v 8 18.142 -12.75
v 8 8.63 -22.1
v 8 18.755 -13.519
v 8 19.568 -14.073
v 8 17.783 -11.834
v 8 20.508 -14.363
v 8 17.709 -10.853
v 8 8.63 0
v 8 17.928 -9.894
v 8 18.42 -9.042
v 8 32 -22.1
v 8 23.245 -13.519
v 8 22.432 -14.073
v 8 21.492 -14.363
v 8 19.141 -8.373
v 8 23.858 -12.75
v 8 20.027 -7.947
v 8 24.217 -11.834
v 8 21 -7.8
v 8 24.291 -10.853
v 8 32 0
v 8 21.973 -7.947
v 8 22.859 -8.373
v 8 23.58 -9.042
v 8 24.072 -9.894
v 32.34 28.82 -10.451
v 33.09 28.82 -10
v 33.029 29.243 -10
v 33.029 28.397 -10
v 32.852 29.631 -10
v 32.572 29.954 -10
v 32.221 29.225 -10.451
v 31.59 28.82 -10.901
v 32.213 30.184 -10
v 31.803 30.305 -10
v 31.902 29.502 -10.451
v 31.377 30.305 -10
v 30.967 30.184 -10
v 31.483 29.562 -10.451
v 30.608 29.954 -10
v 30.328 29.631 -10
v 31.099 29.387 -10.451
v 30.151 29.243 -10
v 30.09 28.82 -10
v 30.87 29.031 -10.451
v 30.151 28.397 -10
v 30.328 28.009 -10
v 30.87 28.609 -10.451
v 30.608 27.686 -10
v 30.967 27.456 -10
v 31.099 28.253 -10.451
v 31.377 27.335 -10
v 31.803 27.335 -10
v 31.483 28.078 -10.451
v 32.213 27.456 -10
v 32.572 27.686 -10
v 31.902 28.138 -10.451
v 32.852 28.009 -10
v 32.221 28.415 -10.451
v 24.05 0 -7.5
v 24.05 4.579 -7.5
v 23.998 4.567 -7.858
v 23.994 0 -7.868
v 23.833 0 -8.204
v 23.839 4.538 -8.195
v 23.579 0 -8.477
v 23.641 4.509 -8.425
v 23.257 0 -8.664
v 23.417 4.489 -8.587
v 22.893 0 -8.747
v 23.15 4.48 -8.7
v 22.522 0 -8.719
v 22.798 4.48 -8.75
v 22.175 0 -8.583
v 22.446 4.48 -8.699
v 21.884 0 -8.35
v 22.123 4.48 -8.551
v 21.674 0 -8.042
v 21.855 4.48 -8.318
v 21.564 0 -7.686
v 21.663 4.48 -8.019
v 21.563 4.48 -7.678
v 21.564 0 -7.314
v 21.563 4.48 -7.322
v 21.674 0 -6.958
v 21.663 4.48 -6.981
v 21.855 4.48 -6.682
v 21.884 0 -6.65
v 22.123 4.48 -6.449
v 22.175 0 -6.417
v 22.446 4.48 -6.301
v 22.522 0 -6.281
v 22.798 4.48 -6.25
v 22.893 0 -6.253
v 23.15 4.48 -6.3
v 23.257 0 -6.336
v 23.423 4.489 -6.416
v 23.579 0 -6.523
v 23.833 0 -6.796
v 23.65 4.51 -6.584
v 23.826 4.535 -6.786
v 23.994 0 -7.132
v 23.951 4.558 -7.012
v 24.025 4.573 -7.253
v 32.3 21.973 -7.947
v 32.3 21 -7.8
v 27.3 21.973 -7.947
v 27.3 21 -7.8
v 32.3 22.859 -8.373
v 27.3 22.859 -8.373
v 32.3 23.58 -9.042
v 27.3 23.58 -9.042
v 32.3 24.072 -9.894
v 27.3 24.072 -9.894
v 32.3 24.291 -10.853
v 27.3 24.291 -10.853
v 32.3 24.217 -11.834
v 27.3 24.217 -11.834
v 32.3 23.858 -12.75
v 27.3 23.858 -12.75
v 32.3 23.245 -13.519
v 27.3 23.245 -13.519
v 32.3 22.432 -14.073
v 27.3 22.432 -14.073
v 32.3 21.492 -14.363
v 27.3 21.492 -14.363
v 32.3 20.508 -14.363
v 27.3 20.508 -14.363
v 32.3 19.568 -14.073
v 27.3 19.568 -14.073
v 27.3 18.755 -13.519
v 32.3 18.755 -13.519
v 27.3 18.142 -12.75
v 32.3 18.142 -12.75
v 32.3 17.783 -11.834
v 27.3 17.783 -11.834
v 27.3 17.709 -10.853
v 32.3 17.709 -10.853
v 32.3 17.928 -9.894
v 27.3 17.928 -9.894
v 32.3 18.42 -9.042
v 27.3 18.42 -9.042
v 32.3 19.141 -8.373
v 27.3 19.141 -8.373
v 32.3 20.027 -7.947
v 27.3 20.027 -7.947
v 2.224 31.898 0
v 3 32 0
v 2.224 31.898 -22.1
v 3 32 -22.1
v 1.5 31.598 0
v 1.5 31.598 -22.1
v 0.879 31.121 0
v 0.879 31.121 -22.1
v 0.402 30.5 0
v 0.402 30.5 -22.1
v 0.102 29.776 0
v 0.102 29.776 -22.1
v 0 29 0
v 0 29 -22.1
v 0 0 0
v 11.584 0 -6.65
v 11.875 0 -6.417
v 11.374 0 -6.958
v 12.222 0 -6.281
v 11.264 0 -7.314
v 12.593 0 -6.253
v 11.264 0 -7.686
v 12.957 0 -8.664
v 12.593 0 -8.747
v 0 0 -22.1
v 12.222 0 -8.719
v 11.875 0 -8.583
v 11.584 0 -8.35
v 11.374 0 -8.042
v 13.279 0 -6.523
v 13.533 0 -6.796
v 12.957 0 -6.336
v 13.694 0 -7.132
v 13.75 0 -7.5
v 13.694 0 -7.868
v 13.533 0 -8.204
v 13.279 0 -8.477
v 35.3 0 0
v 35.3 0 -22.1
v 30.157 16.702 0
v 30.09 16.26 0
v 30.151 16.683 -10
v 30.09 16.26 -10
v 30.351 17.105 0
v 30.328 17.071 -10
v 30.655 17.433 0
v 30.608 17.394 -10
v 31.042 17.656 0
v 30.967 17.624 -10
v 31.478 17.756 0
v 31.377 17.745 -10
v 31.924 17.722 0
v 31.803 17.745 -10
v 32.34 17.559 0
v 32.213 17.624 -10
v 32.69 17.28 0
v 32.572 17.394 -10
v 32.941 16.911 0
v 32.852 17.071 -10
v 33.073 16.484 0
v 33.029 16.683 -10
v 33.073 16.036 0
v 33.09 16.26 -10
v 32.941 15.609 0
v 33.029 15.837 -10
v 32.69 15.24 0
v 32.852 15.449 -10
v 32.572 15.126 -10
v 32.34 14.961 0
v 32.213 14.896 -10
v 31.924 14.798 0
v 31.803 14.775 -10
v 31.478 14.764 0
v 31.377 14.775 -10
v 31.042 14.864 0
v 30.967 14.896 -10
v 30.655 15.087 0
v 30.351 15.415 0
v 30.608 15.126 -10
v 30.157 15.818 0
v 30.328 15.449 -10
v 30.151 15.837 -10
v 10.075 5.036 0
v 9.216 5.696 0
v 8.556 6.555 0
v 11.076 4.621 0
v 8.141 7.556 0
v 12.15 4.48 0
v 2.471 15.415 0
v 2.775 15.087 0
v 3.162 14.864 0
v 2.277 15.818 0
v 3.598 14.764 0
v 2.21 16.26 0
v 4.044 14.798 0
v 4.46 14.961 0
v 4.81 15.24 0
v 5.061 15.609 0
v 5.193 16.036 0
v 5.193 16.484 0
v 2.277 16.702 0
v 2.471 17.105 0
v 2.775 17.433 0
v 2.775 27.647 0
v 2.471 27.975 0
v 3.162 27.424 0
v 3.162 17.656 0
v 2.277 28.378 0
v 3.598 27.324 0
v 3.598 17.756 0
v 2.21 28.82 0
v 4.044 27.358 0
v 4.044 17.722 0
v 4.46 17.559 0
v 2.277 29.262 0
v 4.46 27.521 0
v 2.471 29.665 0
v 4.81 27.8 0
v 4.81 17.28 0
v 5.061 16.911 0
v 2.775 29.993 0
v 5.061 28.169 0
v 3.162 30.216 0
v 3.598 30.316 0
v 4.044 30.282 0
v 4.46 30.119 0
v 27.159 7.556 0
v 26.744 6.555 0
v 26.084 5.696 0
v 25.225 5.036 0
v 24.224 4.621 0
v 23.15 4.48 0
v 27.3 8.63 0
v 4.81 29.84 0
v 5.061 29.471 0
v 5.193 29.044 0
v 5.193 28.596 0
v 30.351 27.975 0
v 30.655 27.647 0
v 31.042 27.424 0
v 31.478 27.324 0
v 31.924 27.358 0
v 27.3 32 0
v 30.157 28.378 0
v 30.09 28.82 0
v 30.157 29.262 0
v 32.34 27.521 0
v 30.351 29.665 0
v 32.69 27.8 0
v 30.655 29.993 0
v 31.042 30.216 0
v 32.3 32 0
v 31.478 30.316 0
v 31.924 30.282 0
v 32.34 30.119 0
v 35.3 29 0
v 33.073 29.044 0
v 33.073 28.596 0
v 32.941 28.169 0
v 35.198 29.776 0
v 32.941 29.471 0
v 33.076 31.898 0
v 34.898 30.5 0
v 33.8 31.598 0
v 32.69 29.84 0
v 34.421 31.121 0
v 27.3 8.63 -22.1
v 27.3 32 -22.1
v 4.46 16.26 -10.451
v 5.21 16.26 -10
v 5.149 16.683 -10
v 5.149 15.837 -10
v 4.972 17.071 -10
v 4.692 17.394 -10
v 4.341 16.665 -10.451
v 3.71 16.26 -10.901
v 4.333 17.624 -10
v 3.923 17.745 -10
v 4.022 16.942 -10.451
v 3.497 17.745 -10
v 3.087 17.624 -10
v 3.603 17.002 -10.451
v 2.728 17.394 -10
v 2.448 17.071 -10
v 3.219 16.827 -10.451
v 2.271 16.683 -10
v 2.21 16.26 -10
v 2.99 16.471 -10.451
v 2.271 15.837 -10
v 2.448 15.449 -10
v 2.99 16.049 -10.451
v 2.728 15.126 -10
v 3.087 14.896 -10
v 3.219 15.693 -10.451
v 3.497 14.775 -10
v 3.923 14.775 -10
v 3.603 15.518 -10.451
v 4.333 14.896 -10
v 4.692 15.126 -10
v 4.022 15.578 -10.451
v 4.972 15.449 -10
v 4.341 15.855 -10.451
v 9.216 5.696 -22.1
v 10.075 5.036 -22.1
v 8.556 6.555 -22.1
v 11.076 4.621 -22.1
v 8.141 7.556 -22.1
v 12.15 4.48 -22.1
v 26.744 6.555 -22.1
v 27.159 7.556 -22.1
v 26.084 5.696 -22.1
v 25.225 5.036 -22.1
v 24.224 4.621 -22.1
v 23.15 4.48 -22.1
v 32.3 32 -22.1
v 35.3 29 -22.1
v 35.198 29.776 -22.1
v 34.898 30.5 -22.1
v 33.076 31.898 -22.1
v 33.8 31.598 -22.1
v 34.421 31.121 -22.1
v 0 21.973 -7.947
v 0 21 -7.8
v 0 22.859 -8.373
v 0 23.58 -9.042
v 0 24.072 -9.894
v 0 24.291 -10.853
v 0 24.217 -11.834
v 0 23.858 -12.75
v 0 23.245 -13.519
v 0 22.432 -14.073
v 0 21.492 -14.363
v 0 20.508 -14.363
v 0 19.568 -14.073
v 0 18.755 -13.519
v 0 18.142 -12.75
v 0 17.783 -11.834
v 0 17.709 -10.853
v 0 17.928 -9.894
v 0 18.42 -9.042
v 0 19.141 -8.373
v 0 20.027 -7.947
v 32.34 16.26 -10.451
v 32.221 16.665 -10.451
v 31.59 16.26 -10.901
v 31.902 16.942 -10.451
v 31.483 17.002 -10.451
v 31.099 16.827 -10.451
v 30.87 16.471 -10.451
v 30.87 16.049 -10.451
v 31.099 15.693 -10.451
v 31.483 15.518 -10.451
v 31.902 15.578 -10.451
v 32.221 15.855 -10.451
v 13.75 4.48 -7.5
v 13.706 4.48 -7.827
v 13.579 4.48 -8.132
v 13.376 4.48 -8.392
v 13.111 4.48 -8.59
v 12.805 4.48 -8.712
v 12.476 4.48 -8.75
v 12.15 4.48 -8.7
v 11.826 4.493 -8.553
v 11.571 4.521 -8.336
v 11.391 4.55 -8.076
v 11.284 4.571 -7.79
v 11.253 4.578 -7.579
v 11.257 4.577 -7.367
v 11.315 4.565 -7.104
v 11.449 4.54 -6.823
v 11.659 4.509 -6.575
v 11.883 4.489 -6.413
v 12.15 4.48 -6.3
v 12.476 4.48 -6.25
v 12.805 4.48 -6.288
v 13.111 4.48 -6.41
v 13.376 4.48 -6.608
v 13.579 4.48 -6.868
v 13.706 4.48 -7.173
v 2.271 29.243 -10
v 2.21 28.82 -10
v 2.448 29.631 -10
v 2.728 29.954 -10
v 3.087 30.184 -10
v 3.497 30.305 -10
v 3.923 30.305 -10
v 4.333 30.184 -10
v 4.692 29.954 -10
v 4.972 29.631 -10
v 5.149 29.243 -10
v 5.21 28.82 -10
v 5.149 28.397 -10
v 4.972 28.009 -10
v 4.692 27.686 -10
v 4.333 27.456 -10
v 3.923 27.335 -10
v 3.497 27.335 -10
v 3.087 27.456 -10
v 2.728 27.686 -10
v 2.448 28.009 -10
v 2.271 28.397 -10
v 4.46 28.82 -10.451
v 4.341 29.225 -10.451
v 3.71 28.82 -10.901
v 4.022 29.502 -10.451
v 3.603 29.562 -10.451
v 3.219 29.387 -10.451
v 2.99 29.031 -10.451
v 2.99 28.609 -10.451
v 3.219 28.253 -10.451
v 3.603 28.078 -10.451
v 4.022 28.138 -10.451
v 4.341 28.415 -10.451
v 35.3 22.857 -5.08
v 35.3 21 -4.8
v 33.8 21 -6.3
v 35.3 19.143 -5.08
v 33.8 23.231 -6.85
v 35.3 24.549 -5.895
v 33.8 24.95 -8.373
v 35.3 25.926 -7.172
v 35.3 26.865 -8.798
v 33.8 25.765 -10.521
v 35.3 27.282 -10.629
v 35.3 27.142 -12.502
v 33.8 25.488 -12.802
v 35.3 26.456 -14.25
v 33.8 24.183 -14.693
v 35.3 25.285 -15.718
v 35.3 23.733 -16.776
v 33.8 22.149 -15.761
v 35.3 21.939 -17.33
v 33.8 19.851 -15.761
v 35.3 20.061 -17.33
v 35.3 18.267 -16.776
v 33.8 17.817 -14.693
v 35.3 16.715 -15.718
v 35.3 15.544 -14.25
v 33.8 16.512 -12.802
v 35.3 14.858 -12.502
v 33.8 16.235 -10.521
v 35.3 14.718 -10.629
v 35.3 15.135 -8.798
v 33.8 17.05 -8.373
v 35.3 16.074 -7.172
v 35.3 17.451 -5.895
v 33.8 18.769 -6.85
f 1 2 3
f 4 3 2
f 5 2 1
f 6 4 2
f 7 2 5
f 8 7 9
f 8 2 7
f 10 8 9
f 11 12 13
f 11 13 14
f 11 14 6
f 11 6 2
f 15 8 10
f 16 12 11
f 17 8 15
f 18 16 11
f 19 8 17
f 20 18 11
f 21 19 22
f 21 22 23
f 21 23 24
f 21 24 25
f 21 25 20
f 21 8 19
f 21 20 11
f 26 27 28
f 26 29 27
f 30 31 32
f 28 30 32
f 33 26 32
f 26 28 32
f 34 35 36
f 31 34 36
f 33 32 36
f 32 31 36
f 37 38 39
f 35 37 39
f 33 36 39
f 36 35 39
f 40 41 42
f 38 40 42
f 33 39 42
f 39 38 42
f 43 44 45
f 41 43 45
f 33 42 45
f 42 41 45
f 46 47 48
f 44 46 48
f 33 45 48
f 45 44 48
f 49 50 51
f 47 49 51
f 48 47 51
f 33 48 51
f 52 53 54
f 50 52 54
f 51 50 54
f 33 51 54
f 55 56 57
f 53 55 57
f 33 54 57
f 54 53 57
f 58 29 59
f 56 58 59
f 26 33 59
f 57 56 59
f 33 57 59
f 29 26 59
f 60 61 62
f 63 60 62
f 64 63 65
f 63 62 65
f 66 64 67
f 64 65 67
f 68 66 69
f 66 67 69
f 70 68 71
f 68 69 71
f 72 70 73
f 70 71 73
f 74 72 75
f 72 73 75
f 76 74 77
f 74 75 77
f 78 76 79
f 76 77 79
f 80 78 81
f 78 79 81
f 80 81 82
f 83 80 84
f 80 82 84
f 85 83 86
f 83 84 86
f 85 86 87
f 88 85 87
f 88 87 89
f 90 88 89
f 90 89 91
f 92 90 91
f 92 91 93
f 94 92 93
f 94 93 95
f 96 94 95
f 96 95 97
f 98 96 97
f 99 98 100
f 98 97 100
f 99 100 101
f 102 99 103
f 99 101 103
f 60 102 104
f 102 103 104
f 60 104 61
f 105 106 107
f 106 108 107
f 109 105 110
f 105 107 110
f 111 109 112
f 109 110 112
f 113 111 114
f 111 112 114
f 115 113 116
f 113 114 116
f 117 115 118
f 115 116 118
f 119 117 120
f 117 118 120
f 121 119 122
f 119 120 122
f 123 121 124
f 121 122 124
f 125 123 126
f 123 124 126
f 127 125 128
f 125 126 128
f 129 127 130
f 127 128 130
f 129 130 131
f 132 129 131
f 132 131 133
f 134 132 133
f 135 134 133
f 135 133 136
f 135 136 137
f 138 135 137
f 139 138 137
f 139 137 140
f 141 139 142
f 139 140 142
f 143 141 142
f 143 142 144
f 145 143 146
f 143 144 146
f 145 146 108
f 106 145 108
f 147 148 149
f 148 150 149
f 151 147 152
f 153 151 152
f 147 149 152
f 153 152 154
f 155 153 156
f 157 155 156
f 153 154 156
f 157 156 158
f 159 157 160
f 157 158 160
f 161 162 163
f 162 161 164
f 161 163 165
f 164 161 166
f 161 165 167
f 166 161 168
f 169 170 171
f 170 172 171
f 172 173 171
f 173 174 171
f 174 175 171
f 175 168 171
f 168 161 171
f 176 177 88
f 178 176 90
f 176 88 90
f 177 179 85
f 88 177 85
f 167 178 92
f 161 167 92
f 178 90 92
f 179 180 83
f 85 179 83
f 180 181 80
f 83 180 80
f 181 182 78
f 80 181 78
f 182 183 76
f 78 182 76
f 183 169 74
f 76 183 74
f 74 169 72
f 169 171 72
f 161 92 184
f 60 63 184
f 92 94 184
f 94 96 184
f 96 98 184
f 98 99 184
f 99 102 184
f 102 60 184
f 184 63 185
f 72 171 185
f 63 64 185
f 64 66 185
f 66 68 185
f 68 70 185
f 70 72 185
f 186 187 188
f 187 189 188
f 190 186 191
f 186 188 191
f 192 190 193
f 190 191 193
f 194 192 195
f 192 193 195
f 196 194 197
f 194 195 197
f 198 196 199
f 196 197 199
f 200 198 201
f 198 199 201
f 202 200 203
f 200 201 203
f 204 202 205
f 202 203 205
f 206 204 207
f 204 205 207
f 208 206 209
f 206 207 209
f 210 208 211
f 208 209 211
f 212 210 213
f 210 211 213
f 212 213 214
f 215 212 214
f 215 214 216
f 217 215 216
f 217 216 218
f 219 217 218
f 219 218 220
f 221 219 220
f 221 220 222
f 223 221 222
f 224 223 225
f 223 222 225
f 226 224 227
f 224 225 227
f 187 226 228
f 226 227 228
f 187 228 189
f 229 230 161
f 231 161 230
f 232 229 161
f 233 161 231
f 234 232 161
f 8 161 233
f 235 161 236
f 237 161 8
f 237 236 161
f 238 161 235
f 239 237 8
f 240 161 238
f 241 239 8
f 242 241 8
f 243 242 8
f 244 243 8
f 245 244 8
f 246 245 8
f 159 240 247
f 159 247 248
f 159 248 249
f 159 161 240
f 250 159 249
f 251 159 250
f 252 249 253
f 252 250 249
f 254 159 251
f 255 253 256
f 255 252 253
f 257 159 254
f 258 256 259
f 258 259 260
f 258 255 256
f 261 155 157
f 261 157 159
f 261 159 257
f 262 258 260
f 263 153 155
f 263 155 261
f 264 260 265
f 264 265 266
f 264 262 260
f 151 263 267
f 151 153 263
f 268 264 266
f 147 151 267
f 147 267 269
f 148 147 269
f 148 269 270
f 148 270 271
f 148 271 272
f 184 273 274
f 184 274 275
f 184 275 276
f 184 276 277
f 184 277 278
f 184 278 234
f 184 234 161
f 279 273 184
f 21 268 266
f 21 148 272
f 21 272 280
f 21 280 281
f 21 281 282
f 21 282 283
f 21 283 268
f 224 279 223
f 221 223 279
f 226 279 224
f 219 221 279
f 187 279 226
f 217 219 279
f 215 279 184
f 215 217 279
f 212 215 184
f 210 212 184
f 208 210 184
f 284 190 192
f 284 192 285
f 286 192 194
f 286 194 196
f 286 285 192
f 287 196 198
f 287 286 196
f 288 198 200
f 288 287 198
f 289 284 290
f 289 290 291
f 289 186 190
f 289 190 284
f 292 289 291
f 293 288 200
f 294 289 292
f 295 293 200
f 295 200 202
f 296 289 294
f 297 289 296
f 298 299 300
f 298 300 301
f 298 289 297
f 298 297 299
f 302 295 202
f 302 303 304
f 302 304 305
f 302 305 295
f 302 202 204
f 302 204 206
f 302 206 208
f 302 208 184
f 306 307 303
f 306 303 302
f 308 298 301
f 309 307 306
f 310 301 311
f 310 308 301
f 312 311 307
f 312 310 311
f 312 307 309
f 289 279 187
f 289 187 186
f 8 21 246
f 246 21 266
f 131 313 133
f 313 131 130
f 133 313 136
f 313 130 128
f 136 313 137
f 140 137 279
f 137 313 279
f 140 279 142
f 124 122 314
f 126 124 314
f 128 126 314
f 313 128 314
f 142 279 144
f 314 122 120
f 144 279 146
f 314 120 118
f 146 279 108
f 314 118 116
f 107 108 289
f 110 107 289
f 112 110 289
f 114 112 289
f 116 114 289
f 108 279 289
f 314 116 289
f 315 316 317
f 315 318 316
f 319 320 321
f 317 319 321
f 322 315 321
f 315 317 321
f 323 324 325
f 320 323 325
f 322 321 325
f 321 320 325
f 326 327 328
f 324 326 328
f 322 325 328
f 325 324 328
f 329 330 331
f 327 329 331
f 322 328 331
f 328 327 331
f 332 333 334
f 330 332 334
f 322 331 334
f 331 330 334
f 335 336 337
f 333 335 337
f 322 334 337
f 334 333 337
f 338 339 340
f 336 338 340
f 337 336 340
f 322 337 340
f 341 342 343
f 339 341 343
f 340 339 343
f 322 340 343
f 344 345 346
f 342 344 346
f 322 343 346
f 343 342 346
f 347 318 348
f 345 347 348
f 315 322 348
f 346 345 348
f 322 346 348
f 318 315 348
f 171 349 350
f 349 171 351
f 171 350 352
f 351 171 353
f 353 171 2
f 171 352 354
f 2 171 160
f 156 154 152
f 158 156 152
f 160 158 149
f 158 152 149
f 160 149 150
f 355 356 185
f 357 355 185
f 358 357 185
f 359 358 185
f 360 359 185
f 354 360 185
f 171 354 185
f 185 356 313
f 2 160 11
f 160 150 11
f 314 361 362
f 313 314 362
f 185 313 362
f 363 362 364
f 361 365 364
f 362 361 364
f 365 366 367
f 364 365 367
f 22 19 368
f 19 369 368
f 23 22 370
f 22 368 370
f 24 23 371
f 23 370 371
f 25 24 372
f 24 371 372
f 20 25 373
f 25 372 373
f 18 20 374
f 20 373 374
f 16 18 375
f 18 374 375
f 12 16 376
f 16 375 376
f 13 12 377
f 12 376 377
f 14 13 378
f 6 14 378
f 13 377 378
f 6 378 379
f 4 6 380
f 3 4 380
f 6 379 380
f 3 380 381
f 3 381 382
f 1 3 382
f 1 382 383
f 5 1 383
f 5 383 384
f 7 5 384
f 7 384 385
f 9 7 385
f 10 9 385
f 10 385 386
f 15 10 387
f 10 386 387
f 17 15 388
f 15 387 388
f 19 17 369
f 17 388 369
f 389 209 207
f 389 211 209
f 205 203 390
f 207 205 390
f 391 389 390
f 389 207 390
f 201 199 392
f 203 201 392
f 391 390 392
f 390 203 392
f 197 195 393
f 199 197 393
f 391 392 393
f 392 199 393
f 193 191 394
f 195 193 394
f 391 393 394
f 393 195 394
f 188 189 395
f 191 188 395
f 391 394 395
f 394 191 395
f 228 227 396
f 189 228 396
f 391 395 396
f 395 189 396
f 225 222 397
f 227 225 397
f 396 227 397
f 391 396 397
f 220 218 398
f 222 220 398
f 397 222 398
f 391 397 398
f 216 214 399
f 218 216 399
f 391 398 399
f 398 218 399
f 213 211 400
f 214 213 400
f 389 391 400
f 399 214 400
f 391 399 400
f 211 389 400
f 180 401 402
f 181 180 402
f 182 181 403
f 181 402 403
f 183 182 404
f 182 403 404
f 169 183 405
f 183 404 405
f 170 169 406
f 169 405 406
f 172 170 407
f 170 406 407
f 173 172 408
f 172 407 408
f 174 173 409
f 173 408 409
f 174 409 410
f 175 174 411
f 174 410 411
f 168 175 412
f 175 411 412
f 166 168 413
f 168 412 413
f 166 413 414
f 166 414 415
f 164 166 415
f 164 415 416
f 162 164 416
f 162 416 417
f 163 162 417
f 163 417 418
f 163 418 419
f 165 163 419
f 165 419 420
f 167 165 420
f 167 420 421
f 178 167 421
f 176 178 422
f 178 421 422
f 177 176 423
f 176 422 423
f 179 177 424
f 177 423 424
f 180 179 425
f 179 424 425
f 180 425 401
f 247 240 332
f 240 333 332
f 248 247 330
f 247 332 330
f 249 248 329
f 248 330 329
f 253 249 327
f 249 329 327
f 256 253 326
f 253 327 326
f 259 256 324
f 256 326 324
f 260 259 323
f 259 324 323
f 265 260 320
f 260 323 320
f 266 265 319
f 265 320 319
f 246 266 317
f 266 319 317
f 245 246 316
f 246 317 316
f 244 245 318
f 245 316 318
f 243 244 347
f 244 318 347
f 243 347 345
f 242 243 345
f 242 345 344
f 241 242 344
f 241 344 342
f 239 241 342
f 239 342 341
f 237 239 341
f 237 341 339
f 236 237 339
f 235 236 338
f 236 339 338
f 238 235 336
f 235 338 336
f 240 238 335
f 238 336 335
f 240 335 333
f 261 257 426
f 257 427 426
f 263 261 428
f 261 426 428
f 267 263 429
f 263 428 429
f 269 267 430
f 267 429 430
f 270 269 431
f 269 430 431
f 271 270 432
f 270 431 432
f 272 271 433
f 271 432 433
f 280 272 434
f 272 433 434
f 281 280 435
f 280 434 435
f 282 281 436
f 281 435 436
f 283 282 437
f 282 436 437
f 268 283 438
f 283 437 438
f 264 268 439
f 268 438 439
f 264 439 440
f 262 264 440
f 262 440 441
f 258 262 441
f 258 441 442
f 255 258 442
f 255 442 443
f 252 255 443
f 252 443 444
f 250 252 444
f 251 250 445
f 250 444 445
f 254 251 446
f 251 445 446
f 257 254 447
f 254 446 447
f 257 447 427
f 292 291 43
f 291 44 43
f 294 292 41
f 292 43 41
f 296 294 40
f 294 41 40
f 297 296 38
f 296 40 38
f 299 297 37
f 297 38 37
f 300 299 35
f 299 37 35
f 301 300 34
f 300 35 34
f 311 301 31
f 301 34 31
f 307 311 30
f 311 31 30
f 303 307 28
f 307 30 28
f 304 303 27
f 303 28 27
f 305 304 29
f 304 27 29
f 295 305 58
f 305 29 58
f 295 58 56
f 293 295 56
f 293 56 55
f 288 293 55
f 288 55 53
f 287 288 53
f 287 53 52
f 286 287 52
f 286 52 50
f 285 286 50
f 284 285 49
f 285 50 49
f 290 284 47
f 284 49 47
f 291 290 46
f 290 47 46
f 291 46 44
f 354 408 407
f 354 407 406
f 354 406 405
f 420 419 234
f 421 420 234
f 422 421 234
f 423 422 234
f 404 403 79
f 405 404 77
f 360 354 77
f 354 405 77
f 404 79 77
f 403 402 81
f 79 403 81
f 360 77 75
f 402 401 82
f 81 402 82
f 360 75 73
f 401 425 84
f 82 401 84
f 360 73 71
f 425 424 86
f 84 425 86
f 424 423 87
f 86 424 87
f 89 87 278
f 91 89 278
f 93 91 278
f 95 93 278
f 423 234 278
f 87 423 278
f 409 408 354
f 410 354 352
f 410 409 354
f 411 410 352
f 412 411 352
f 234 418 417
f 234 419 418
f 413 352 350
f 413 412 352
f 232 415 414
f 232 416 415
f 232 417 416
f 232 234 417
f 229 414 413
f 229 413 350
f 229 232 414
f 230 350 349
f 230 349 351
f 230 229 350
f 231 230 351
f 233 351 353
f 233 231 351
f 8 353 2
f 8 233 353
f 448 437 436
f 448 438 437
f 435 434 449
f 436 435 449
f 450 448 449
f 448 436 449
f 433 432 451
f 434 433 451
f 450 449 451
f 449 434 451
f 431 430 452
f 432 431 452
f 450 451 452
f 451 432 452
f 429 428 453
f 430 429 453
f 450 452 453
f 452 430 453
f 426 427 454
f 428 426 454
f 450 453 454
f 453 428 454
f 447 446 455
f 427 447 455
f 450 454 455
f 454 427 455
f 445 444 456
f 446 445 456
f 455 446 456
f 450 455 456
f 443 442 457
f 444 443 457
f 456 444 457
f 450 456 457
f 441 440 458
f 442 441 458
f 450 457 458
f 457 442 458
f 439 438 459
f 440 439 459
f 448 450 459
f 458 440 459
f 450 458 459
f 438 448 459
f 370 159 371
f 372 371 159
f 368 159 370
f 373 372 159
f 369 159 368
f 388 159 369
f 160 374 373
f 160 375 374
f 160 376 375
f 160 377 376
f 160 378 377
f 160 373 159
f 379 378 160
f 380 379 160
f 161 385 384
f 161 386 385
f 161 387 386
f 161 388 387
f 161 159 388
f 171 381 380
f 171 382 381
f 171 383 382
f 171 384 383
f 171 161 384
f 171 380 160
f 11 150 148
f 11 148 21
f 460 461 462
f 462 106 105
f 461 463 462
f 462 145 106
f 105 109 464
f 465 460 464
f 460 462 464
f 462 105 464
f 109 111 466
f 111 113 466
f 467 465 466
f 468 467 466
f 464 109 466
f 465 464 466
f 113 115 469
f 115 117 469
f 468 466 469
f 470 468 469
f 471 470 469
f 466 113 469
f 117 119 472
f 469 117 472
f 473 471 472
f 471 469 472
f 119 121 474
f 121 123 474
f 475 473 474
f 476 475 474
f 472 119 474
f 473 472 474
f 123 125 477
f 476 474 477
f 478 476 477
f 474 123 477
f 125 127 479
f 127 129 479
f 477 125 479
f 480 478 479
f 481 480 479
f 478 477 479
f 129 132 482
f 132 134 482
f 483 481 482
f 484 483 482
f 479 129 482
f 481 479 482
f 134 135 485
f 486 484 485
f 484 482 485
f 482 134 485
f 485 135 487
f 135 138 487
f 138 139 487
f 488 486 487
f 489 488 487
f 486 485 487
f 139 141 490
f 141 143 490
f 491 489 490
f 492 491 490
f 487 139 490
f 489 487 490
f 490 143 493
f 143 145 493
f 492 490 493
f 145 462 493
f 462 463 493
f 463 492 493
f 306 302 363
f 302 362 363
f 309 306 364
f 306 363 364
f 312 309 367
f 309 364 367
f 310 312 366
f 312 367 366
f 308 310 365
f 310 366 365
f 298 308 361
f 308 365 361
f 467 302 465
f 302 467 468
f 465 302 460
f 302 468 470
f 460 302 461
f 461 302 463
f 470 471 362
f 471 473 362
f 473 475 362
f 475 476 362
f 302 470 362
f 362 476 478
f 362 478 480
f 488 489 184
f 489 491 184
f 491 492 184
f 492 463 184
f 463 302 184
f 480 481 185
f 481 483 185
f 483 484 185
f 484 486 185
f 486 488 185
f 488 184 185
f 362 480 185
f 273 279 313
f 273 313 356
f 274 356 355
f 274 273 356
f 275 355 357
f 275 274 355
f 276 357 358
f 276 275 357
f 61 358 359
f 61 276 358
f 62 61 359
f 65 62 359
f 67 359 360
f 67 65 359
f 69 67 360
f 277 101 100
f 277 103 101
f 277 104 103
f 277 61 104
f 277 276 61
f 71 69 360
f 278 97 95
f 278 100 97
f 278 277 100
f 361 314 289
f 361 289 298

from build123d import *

# Parameters (mm, degrees)
SKETCH1_W                                           = 35.3
SKETCH1_H                                           = 22.1
BOSS_EXTRUDE1_DEPTH                                 = 32
SKETCH2_W                                           = 19.3
SKETCH2_H                                           = 27.52
CUT_EXTRUDE1_DEPTH                                  = 32
BOSS_EXTRUDE2_DEPTH                                 = 22.1
FILLET1_R                                           = 3
CSK_FOR_M6_COUNTERSUNK_FLAT_HEAD_SCREW1_D           = 6.6
CSK_FOR_M6_COUNTERSUNK_FLAT_HEAD_SCREW1_DEPTH       = 45
CSK_FOR_M6_COUNTERSUNK_FLAT_HEAD_SCREW1_CSINK_D     = 12.6
CSK_FOR_M6_COUNTERSUNK_FLAT_HEAD_SCREW1_CSINK_ANGLE = 90
CSK_FOR_M6_COUNTERSUNK_FLAT_HEAD_SCREW1_TIP         = 1.982840043
F_3_0MM_DOWEL_HOLE1_D                               = 3
F_3_0MM_DOWEL_HOLE1_DEPTH                           = 10
F_3_0MM_DOWEL_HOLE1_TIP                             = 0.901290929
F_2_5MM_DOWEL_HOLE1_D                               = 2.5
F_2_5MM_DOWEL_HOLE1_DEPTH                           = 10
F_2_5MM_DOWEL_HOLE1_TIP                             = 0.751075774


with BuildPart() as part:
    # Sketch1 → Boss-Extrude1 (new body)
    with BuildSketch(Plane(origin=(0, 0, 0), x_dir=(1, 0, 0), z_dir=(0, 1, 0))):
        with Locations((17.65, 11.05)):
            Rectangle(SKETCH1_W, SKETCH1_H)
    extrude(amount=BOSS_EXTRUDE1_DEPTH)

    # Sketch2 → Cut-Extrude1 (cut)
    with BuildSketch(Plane.XY):
        with Locations((17.65, 18.24)):
            Rectangle(SKETCH2_W, SKETCH2_H)
    extrude(amount=-CUT_EXTRUDE1_DEPTH, mode=Mode.SUBTRACT)

    # Sketch3 → Boss-Extrude2 (add)
    with BuildSketch(Plane.XY):
        with BuildLine():
            Line((8, 8.63), (8, 4.48))
            Line((8, 4.48), (12.15, 4.48))
            ThreePointArc((12.15, 4.48), (9.215506858, 5.695506858), (8, 8.63))
        make_face()
        with BuildLine():
            Line((27.3, 4.48), (27.3, 8.63))
            ThreePointArc((27.3, 8.63), (26.084493142, 5.695506858), (23.15, 4.48))
            Line((23.15, 4.48), (27.3, 4.48))
        make_face()
    extrude(amount=-BOSS_EXTRUDE2_DEPTH)

    # Fillet1
    fillet1_edges = [part.edges().sort_by_distance(p)[0] for p in [
        (35.3, 32, -11.05),
        (0, 32, -11.05),
    ]]
    fillet(fillet1_edges, radius=FILLET1_R)

    # CSK for M6 Countersunk Flat Head Screw1
    with Locations(Plane(origin=(35.3, 0, 0), x_dir=(0, 0, -1), z_dir=(1, 0, 0))):
        with Locations((11.1, 21)):
            CounterSinkHole(CSK_FOR_M6_COUNTERSUNK_FLAT_HEAD_SCREW1_D / 2, CSK_FOR_M6_COUNTERSUNK_FLAT_HEAD_SCREW1_CSINK_D / 2, depth=CSK_FOR_M6_COUNTERSUNK_FLAT_HEAD_SCREW1_DEPTH, counter_sink_angle=CSK_FOR_M6_COUNTERSUNK_FLAT_HEAD_SCREW1_CSINK_ANGLE)
            with Locations((0, 0, -(CSK_FOR_M6_COUNTERSUNK_FLAT_HEAD_SCREW1_DEPTH + CSK_FOR_M6_COUNTERSUNK_FLAT_HEAD_SCREW1_TIP / 2))):  # 118° drill point
                Cone(0, CSK_FOR_M6_COUNTERSUNK_FLAT_HEAD_SCREW1_D / 2, CSK_FOR_M6_COUNTERSUNK_FLAT_HEAD_SCREW1_TIP, mode=Mode.SUBTRACT)

    # Ø3.0mm Dowel Hole1
    with Locations(Plane.XY):
        with Locations((3.71, 28.82), (3.71, 16.26), (31.59, 28.82), (31.59, 16.26)):
            Hole(F_3_0MM_DOWEL_HOLE1_D / 2, depth=F_3_0MM_DOWEL_HOLE1_DEPTH)
            with Locations((0, 0, -(F_3_0MM_DOWEL_HOLE1_DEPTH + F_3_0MM_DOWEL_HOLE1_TIP / 2))):  # 118° drill point
                Cone(0, F_3_0MM_DOWEL_HOLE1_D / 2, F_3_0MM_DOWEL_HOLE1_TIP, mode=Mode.SUBTRACT)

    # Ø2.5mm Dowel Hole1
    with Locations(Plane(origin=(0, 0, 0), x_dir=(-1, 0, 0), z_dir=(0, -1, 0))):
        with Locations((-12.5, 7.5), (-22.8, 7.5)):
            Hole(F_2_5MM_DOWEL_HOLE1_D / 2, depth=F_2_5MM_DOWEL_HOLE1_DEPTH)
            with Locations((0, 0, -(F_2_5MM_DOWEL_HOLE1_DEPTH + F_2_5MM_DOWEL_HOLE1_TIP / 2))):  # 118° drill point
                Cone(0, F_2_5MM_DOWEL_HOLE1_D / 2, F_2_5MM_DOWEL_HOLE1_TIP, mode=Mode.SUBTRACT)


solid = part.part
